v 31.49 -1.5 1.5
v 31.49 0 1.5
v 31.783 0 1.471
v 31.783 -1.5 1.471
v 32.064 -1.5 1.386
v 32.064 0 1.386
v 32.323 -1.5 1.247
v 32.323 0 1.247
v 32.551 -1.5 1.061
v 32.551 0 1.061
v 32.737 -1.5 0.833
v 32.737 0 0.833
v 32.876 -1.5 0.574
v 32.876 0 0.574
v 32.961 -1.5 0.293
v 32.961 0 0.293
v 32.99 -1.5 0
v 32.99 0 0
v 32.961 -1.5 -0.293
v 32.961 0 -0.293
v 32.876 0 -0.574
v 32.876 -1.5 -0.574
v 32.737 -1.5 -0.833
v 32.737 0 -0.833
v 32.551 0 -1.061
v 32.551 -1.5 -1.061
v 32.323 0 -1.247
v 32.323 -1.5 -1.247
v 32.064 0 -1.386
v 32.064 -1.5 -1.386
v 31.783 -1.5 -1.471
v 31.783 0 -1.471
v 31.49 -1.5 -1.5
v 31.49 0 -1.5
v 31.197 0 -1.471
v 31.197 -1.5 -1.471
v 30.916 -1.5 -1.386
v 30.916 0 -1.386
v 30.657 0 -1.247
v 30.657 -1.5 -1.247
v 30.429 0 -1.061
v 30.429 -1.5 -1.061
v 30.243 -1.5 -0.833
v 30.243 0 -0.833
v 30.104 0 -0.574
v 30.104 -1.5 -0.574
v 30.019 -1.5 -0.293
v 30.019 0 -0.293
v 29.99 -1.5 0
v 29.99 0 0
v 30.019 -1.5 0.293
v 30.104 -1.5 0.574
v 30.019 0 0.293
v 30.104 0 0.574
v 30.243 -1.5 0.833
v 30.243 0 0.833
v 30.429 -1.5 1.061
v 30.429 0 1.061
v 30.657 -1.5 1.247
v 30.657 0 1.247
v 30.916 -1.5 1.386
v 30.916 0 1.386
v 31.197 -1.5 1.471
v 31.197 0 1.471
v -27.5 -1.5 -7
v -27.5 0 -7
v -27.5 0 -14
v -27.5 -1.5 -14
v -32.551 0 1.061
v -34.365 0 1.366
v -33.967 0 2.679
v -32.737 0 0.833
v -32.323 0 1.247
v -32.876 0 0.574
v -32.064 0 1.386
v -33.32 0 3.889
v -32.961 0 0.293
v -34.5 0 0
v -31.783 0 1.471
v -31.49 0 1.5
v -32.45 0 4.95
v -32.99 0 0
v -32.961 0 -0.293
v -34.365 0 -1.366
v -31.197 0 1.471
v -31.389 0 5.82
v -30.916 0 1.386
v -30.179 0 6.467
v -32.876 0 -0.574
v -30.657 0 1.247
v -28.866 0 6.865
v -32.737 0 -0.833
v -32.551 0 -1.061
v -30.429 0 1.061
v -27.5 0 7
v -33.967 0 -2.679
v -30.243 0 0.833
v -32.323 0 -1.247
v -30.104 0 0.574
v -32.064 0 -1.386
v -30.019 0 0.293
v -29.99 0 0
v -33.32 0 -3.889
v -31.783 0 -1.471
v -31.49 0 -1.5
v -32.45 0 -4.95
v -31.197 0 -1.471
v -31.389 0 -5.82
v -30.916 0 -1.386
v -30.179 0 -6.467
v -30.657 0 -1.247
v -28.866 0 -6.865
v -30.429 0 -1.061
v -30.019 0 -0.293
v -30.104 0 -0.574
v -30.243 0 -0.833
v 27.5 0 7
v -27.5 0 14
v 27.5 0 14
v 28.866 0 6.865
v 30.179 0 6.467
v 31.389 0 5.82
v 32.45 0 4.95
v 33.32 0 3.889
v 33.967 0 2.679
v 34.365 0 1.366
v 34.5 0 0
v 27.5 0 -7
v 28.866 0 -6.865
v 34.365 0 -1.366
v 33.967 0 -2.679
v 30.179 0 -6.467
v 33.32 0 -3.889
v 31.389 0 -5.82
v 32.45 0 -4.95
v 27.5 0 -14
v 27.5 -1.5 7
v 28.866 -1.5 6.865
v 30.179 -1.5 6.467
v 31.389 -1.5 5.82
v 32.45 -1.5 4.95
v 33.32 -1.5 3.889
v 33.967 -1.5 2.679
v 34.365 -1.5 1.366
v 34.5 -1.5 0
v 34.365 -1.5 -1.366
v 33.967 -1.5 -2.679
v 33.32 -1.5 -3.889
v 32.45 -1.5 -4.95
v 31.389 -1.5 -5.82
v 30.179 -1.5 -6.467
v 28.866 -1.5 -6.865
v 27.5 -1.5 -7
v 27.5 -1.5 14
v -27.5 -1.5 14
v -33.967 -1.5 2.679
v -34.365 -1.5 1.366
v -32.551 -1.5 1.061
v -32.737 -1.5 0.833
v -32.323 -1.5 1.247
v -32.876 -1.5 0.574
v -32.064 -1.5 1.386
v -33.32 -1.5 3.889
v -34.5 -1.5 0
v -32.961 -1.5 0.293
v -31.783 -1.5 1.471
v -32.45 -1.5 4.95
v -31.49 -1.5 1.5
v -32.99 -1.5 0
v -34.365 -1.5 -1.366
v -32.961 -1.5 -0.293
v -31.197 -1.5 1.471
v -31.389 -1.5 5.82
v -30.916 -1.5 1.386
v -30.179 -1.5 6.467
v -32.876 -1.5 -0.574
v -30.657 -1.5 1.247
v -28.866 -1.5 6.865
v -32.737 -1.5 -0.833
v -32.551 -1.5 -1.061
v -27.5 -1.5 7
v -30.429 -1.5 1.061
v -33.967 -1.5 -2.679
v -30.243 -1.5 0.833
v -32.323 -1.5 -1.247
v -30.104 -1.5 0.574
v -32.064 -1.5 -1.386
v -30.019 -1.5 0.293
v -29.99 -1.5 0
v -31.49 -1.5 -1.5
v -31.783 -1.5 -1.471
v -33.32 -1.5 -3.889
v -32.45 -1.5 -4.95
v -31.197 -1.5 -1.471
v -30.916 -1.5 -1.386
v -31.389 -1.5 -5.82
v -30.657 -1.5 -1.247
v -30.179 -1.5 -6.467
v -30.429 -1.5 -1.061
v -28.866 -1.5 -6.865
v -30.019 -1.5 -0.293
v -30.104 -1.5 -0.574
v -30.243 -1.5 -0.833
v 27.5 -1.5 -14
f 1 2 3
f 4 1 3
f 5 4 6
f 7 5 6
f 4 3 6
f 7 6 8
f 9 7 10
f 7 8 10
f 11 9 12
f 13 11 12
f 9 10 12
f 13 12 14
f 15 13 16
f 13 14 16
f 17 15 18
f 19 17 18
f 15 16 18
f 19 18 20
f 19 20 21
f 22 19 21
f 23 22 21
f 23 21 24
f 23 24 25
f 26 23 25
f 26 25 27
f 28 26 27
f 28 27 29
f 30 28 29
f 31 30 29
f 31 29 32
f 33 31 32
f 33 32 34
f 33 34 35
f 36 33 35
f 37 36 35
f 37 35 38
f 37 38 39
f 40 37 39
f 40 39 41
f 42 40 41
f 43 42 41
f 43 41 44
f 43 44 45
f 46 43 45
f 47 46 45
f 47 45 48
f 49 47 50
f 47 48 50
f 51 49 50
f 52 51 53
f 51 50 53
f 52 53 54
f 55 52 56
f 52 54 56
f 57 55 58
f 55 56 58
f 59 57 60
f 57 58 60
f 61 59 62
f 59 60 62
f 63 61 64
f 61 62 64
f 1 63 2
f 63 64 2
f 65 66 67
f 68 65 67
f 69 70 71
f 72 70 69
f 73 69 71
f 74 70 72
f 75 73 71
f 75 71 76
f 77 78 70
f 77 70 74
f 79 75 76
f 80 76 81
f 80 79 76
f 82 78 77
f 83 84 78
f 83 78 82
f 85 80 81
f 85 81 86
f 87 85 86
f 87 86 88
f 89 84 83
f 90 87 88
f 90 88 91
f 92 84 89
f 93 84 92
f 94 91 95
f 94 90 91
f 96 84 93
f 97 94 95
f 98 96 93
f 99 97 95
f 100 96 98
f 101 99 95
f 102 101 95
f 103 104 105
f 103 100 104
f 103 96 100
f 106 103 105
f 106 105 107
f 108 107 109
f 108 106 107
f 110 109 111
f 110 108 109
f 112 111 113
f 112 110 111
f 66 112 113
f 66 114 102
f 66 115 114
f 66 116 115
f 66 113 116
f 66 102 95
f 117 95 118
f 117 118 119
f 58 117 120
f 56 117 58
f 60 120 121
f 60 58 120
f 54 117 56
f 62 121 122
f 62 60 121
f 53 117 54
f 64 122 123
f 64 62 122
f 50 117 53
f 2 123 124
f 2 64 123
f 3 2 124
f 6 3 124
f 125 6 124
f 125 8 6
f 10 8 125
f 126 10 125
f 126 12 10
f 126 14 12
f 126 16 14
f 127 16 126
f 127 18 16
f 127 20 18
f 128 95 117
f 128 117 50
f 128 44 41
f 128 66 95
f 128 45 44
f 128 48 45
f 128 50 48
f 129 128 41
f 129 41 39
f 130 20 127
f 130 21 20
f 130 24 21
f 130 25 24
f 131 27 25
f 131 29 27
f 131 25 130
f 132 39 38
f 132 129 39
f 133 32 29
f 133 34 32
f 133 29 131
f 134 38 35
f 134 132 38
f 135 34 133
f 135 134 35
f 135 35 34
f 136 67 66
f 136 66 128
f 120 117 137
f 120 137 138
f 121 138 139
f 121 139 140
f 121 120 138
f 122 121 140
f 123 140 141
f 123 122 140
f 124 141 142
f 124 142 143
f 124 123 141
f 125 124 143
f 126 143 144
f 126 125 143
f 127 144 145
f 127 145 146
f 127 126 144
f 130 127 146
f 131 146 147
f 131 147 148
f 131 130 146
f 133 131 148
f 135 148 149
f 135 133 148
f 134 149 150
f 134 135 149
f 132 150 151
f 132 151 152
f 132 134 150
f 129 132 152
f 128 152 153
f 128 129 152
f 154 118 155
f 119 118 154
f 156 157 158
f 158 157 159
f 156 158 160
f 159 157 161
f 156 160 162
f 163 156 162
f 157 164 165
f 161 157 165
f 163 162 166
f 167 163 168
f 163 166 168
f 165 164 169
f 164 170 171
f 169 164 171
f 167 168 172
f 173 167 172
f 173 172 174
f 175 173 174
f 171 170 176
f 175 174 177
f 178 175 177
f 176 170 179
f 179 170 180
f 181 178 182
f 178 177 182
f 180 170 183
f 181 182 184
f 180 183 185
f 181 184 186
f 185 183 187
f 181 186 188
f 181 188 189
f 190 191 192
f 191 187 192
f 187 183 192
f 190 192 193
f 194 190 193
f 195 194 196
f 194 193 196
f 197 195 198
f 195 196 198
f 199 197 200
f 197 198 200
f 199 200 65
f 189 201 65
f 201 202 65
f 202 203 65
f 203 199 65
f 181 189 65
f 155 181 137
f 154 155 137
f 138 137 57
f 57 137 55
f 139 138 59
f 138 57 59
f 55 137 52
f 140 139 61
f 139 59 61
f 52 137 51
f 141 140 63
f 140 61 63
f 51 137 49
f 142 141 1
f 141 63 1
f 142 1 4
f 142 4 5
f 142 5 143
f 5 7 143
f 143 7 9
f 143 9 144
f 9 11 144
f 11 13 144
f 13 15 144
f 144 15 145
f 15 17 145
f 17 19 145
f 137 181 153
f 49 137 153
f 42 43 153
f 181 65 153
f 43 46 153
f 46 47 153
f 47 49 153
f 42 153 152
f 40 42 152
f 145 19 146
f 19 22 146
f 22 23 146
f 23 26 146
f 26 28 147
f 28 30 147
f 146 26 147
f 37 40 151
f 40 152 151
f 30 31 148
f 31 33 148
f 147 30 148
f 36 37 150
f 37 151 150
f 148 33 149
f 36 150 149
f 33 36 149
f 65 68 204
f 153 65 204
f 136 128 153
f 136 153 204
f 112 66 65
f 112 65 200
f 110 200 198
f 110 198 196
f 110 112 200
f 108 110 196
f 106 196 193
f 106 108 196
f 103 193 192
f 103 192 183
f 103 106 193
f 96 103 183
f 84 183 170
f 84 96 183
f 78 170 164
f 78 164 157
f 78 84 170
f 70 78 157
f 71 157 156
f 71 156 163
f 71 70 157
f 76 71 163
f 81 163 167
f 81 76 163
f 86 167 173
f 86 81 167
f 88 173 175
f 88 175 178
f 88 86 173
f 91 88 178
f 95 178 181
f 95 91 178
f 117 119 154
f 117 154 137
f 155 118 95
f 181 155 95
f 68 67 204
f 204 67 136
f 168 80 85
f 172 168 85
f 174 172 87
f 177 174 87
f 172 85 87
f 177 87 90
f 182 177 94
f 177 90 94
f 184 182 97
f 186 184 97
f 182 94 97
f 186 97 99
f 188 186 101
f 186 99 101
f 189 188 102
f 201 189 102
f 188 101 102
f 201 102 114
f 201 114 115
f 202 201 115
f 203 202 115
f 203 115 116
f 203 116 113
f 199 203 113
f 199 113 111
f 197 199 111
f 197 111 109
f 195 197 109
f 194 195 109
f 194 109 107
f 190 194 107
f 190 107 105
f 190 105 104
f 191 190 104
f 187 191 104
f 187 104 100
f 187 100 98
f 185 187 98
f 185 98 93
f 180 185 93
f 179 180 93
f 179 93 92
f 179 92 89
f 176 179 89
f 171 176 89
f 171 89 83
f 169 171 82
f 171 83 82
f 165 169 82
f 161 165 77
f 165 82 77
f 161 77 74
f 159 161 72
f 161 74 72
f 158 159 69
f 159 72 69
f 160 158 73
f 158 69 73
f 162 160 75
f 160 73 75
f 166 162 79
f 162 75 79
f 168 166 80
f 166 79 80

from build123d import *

# Parameters (mm, degrees)
SKETCH1_W           = 55
SKETCH1_H           = 28
BOSS_EXTRUDE1_DEPTH = 1.5
SKETCH4_R           = 1.5
CUT_EXTRUDE1_DEPTH  = 38.262581768


with BuildPart() as part:
    # Sketch1 → Boss-Extrude1 (new body)
    with BuildSketch(Plane(origin=(0, 0, 0), x_dir=(1, 0, 0), z_dir=(0, 1, 0))):
        Rectangle(SKETCH1_W, SKETCH1_H)
        with BuildLine():
            Line((-27.5, -7), (-27.5, 7))
            ThreePointArc((-27.5, 7), (-34.5, 0), (-27.5, -7))
        make_face()
        with BuildLine():
            ThreePointArc((27.5, -7), (34.5, 0), (27.5, 7))
            Line((27.5, 7), (27.5, -7))
        make_face()
    extrude(amount=-BOSS_EXTRUDE1_DEPTH)

    # Sketch4 → Cut-Extrude1 (cut, through all)
    with BuildSketch(Plane(origin=(0, 0, 0), x_dir=(1, 0, 0), z_dir=(0, 1, 0))):
        with Locations(Location((-31.49, 0, 0), (0, 0, 270))):
            Circle(SKETCH4_R)
        with Locations(Location((31.49, 0, 0), (0, 0, 270))):
            Circle(SKETCH4_R)
    extrude(amount=-CUT_EXTRUDE1_DEPTH, mode=Mode.SUBTRACT)


solid = part.part
